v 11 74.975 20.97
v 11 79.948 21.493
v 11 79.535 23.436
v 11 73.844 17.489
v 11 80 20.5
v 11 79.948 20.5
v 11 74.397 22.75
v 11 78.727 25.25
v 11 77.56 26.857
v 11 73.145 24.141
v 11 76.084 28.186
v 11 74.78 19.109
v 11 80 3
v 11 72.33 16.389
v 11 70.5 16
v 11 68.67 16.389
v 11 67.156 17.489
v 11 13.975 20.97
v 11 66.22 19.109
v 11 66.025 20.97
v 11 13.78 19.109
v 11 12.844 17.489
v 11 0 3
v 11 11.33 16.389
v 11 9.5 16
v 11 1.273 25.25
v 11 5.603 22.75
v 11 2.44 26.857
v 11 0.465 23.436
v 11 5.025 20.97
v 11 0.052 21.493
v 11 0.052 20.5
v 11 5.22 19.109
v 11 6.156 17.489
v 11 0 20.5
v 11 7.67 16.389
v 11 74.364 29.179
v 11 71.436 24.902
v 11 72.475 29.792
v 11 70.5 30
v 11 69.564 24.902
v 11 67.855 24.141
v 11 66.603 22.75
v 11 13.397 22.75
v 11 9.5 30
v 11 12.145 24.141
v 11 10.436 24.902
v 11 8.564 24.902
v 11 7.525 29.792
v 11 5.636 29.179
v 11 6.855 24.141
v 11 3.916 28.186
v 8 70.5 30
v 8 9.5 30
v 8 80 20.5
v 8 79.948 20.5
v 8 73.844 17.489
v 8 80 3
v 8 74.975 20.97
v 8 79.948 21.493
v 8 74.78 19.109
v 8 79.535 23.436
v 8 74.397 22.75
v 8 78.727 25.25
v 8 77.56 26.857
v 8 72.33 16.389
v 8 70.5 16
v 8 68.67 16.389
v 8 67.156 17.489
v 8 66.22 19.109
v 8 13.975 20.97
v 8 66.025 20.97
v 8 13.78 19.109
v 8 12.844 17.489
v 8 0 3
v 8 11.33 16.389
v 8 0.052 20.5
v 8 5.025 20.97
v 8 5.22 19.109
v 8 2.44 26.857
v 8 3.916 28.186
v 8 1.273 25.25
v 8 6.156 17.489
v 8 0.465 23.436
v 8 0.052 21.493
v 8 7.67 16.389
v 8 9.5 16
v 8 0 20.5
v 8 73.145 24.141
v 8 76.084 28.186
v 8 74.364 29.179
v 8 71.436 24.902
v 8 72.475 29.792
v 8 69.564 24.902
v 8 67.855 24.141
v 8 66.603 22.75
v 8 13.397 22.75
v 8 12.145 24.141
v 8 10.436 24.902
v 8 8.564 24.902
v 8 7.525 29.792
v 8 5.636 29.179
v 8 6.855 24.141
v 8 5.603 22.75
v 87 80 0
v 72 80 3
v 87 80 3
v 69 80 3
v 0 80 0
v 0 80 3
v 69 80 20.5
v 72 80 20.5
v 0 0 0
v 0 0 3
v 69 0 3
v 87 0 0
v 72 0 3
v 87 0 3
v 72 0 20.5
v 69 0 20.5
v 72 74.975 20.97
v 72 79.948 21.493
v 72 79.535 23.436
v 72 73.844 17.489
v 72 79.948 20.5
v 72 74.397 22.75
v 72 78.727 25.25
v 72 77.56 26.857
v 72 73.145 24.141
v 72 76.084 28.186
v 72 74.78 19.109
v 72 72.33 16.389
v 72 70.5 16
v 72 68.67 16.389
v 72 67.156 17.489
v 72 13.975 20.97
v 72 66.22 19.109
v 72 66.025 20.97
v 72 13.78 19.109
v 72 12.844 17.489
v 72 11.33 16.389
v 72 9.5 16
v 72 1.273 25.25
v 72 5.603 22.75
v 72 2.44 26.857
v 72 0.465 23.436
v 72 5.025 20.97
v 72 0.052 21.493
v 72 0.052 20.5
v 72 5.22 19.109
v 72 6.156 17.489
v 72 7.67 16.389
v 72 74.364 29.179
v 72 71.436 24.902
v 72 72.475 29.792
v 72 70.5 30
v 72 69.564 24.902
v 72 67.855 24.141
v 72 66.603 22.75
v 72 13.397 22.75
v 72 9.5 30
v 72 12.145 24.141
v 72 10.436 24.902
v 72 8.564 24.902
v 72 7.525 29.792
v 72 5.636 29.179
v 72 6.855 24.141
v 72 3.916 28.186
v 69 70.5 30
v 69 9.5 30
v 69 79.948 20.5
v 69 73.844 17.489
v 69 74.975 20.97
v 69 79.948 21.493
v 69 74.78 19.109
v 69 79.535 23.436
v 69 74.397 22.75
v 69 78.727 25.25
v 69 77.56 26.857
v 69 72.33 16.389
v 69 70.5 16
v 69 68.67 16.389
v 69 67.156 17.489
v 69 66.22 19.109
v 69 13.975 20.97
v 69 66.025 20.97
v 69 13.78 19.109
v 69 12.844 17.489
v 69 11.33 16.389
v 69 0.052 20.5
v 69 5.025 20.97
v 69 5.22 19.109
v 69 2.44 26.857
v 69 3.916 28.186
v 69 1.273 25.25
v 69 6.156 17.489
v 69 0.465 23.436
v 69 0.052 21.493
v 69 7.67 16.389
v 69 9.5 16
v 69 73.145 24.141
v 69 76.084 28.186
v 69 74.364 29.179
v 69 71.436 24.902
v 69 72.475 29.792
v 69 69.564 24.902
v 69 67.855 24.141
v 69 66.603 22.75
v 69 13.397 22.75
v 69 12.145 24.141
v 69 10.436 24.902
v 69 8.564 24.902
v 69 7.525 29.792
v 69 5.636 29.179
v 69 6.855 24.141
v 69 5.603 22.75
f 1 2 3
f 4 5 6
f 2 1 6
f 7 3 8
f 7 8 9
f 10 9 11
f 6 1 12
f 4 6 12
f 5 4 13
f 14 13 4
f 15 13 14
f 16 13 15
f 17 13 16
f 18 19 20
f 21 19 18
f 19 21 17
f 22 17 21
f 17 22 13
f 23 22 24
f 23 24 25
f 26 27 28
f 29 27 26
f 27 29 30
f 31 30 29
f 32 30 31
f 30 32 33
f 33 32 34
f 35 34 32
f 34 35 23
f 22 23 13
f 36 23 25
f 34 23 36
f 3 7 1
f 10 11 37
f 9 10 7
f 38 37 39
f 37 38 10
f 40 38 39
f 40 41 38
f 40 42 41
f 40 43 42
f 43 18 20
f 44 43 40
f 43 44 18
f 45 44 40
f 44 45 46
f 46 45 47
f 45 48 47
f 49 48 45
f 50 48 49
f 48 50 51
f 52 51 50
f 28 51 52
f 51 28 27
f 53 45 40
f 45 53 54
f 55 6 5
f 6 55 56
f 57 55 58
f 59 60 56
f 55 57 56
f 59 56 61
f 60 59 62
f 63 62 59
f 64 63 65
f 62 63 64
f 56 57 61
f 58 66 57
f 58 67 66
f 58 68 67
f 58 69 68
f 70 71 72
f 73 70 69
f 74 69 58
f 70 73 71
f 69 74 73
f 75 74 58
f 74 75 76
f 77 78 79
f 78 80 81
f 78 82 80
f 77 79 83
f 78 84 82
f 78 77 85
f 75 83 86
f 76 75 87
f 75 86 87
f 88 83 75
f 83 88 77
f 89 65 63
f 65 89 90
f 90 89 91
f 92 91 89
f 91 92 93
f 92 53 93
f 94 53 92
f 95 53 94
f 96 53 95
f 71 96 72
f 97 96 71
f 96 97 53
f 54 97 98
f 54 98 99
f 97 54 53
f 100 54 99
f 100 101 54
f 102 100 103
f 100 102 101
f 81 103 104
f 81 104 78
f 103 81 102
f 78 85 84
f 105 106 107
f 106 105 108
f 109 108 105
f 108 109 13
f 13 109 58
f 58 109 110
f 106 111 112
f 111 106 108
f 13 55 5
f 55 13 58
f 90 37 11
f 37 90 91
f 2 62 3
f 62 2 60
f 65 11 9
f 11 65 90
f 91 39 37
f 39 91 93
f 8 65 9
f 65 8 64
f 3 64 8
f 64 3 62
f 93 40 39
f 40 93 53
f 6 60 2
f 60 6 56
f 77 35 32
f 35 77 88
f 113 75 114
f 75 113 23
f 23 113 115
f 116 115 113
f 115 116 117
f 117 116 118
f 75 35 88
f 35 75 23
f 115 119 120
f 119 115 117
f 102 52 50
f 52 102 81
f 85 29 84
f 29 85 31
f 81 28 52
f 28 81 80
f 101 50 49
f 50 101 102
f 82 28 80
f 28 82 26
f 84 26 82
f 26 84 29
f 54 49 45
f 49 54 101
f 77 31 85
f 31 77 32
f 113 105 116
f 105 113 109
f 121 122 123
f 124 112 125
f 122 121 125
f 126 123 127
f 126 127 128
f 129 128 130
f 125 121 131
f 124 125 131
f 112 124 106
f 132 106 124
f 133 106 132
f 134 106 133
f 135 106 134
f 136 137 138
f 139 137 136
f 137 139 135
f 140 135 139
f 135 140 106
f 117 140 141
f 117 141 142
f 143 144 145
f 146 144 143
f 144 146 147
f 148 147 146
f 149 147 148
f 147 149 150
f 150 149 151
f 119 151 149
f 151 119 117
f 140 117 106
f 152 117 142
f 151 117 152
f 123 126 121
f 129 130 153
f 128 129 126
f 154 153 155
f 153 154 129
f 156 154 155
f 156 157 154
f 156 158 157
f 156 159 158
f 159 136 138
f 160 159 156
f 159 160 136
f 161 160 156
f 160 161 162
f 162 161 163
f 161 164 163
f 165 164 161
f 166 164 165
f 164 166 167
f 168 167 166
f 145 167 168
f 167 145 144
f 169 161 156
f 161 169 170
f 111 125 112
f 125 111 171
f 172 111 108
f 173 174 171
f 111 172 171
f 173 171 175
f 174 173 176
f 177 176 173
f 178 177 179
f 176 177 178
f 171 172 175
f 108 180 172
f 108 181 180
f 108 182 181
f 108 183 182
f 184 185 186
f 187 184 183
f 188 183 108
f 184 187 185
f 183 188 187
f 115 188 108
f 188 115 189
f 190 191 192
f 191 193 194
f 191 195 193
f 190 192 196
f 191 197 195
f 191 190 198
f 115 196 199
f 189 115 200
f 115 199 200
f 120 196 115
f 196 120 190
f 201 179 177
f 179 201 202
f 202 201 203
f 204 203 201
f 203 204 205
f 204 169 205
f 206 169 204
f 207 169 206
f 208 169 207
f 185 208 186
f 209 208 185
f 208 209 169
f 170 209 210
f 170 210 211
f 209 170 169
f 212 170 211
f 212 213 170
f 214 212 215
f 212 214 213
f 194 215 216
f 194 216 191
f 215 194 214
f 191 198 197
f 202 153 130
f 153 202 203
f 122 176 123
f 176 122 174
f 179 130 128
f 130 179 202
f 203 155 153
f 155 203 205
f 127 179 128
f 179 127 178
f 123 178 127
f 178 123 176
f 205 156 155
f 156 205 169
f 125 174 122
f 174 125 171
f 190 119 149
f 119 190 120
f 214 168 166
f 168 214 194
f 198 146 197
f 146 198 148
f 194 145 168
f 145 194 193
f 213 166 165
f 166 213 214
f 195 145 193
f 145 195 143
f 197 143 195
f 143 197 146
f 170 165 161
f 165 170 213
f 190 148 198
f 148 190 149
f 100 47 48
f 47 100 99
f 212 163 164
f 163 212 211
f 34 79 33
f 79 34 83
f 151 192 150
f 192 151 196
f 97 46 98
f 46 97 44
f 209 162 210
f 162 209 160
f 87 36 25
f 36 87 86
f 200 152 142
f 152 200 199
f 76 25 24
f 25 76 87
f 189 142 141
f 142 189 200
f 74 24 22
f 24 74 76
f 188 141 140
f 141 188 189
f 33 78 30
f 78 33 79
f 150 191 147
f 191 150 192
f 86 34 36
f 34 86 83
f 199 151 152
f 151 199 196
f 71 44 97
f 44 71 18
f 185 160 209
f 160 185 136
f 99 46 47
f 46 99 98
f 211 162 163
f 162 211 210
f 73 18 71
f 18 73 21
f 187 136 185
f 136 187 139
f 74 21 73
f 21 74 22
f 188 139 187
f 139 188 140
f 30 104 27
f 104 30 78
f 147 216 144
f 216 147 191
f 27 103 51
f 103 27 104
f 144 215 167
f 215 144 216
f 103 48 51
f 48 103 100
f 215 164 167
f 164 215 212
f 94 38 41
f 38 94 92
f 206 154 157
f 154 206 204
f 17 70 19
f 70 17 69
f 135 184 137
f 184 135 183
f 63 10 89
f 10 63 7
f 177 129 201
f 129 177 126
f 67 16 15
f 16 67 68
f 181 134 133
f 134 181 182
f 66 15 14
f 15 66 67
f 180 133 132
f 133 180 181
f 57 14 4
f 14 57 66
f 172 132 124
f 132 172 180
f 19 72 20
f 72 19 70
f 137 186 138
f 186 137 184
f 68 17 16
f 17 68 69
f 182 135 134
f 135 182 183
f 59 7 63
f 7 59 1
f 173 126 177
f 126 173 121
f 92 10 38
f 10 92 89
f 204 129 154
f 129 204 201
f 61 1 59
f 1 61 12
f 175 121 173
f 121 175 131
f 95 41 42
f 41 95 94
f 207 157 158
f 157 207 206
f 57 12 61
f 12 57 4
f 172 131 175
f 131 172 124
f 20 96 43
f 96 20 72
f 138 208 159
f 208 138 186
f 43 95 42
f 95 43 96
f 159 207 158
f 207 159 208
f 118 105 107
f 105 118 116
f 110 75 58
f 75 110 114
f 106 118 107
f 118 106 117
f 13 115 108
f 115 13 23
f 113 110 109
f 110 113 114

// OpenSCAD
sp=3; //thickness
asse=65; //distance between vertical wall
base_x=8+sp+asse+sp+8; //dimension X base
base_y=80; //dimension Y base
base_z=30; //dimension Z of the object
hole_dia=9; //four hole
sp_hole=5; //edge around hole of threaded rod
hole_pos_z=base_z-sp_hole-hole_dia/2; //hole position Z

module base(){
cube([8+sp+asse+sp+8,base_y,sp]);
}

module wall(){
translate([8, 0, 0])
  difference() { // difference with round_corner() to make roundness
      cube([sp,base_y,base_z]);
      translate([0, base_y-sp_hole-hole_dia/2, base_z-sp_hole-hole_dia/2]) round_corner();
      translate([0, sp_hole+hole_dia/2, base_z-sp_hole-hole_dia/2]) mirror([0,1,0]) round_corner();
  }

translate([base_y-8-sp, 0, 0])
  difference() { // difference with round_corner() to make roundness
      cube([sp,base_y,base_z]);
      translate([0, base_y-sp_hole-hole_dia/2, base_z-sp_hole-hole_dia/2]) round_corner();
      translate([0, sp_hole+hole_dia/2, base_z-sp_hole-hole_dia/2]) mirror([0,1,0]) round_corner();
  }
}

module round_corner(){  //rounder corner need for difference with cube
difference() {
  cube(size=[sp, sp_hole+hole_dia/2, sp_hole+hole_dia/2], center=false);
  rotate([0, 90, 0]) cylinder(r=sp_hole+hole_dia/2, h=sp, center=false);
  }
}

//main function
base(); //base of filament spool
difference(){
wall();
//hole for threaded rod
translate([0,sp_hole+hole_dia/2, hole_pos_z]) //first rod
rotate([0, 90, 0])
  cylinder(r=hole_dia/2, base_x, center=false);
translate([0,base_y-(sp_hole+hole_dia/2), hole_pos_z]) //second rod
  rotate([0, 90, 0])
    cylinder(r=hole_dia/2, base_x, center=false);
}
